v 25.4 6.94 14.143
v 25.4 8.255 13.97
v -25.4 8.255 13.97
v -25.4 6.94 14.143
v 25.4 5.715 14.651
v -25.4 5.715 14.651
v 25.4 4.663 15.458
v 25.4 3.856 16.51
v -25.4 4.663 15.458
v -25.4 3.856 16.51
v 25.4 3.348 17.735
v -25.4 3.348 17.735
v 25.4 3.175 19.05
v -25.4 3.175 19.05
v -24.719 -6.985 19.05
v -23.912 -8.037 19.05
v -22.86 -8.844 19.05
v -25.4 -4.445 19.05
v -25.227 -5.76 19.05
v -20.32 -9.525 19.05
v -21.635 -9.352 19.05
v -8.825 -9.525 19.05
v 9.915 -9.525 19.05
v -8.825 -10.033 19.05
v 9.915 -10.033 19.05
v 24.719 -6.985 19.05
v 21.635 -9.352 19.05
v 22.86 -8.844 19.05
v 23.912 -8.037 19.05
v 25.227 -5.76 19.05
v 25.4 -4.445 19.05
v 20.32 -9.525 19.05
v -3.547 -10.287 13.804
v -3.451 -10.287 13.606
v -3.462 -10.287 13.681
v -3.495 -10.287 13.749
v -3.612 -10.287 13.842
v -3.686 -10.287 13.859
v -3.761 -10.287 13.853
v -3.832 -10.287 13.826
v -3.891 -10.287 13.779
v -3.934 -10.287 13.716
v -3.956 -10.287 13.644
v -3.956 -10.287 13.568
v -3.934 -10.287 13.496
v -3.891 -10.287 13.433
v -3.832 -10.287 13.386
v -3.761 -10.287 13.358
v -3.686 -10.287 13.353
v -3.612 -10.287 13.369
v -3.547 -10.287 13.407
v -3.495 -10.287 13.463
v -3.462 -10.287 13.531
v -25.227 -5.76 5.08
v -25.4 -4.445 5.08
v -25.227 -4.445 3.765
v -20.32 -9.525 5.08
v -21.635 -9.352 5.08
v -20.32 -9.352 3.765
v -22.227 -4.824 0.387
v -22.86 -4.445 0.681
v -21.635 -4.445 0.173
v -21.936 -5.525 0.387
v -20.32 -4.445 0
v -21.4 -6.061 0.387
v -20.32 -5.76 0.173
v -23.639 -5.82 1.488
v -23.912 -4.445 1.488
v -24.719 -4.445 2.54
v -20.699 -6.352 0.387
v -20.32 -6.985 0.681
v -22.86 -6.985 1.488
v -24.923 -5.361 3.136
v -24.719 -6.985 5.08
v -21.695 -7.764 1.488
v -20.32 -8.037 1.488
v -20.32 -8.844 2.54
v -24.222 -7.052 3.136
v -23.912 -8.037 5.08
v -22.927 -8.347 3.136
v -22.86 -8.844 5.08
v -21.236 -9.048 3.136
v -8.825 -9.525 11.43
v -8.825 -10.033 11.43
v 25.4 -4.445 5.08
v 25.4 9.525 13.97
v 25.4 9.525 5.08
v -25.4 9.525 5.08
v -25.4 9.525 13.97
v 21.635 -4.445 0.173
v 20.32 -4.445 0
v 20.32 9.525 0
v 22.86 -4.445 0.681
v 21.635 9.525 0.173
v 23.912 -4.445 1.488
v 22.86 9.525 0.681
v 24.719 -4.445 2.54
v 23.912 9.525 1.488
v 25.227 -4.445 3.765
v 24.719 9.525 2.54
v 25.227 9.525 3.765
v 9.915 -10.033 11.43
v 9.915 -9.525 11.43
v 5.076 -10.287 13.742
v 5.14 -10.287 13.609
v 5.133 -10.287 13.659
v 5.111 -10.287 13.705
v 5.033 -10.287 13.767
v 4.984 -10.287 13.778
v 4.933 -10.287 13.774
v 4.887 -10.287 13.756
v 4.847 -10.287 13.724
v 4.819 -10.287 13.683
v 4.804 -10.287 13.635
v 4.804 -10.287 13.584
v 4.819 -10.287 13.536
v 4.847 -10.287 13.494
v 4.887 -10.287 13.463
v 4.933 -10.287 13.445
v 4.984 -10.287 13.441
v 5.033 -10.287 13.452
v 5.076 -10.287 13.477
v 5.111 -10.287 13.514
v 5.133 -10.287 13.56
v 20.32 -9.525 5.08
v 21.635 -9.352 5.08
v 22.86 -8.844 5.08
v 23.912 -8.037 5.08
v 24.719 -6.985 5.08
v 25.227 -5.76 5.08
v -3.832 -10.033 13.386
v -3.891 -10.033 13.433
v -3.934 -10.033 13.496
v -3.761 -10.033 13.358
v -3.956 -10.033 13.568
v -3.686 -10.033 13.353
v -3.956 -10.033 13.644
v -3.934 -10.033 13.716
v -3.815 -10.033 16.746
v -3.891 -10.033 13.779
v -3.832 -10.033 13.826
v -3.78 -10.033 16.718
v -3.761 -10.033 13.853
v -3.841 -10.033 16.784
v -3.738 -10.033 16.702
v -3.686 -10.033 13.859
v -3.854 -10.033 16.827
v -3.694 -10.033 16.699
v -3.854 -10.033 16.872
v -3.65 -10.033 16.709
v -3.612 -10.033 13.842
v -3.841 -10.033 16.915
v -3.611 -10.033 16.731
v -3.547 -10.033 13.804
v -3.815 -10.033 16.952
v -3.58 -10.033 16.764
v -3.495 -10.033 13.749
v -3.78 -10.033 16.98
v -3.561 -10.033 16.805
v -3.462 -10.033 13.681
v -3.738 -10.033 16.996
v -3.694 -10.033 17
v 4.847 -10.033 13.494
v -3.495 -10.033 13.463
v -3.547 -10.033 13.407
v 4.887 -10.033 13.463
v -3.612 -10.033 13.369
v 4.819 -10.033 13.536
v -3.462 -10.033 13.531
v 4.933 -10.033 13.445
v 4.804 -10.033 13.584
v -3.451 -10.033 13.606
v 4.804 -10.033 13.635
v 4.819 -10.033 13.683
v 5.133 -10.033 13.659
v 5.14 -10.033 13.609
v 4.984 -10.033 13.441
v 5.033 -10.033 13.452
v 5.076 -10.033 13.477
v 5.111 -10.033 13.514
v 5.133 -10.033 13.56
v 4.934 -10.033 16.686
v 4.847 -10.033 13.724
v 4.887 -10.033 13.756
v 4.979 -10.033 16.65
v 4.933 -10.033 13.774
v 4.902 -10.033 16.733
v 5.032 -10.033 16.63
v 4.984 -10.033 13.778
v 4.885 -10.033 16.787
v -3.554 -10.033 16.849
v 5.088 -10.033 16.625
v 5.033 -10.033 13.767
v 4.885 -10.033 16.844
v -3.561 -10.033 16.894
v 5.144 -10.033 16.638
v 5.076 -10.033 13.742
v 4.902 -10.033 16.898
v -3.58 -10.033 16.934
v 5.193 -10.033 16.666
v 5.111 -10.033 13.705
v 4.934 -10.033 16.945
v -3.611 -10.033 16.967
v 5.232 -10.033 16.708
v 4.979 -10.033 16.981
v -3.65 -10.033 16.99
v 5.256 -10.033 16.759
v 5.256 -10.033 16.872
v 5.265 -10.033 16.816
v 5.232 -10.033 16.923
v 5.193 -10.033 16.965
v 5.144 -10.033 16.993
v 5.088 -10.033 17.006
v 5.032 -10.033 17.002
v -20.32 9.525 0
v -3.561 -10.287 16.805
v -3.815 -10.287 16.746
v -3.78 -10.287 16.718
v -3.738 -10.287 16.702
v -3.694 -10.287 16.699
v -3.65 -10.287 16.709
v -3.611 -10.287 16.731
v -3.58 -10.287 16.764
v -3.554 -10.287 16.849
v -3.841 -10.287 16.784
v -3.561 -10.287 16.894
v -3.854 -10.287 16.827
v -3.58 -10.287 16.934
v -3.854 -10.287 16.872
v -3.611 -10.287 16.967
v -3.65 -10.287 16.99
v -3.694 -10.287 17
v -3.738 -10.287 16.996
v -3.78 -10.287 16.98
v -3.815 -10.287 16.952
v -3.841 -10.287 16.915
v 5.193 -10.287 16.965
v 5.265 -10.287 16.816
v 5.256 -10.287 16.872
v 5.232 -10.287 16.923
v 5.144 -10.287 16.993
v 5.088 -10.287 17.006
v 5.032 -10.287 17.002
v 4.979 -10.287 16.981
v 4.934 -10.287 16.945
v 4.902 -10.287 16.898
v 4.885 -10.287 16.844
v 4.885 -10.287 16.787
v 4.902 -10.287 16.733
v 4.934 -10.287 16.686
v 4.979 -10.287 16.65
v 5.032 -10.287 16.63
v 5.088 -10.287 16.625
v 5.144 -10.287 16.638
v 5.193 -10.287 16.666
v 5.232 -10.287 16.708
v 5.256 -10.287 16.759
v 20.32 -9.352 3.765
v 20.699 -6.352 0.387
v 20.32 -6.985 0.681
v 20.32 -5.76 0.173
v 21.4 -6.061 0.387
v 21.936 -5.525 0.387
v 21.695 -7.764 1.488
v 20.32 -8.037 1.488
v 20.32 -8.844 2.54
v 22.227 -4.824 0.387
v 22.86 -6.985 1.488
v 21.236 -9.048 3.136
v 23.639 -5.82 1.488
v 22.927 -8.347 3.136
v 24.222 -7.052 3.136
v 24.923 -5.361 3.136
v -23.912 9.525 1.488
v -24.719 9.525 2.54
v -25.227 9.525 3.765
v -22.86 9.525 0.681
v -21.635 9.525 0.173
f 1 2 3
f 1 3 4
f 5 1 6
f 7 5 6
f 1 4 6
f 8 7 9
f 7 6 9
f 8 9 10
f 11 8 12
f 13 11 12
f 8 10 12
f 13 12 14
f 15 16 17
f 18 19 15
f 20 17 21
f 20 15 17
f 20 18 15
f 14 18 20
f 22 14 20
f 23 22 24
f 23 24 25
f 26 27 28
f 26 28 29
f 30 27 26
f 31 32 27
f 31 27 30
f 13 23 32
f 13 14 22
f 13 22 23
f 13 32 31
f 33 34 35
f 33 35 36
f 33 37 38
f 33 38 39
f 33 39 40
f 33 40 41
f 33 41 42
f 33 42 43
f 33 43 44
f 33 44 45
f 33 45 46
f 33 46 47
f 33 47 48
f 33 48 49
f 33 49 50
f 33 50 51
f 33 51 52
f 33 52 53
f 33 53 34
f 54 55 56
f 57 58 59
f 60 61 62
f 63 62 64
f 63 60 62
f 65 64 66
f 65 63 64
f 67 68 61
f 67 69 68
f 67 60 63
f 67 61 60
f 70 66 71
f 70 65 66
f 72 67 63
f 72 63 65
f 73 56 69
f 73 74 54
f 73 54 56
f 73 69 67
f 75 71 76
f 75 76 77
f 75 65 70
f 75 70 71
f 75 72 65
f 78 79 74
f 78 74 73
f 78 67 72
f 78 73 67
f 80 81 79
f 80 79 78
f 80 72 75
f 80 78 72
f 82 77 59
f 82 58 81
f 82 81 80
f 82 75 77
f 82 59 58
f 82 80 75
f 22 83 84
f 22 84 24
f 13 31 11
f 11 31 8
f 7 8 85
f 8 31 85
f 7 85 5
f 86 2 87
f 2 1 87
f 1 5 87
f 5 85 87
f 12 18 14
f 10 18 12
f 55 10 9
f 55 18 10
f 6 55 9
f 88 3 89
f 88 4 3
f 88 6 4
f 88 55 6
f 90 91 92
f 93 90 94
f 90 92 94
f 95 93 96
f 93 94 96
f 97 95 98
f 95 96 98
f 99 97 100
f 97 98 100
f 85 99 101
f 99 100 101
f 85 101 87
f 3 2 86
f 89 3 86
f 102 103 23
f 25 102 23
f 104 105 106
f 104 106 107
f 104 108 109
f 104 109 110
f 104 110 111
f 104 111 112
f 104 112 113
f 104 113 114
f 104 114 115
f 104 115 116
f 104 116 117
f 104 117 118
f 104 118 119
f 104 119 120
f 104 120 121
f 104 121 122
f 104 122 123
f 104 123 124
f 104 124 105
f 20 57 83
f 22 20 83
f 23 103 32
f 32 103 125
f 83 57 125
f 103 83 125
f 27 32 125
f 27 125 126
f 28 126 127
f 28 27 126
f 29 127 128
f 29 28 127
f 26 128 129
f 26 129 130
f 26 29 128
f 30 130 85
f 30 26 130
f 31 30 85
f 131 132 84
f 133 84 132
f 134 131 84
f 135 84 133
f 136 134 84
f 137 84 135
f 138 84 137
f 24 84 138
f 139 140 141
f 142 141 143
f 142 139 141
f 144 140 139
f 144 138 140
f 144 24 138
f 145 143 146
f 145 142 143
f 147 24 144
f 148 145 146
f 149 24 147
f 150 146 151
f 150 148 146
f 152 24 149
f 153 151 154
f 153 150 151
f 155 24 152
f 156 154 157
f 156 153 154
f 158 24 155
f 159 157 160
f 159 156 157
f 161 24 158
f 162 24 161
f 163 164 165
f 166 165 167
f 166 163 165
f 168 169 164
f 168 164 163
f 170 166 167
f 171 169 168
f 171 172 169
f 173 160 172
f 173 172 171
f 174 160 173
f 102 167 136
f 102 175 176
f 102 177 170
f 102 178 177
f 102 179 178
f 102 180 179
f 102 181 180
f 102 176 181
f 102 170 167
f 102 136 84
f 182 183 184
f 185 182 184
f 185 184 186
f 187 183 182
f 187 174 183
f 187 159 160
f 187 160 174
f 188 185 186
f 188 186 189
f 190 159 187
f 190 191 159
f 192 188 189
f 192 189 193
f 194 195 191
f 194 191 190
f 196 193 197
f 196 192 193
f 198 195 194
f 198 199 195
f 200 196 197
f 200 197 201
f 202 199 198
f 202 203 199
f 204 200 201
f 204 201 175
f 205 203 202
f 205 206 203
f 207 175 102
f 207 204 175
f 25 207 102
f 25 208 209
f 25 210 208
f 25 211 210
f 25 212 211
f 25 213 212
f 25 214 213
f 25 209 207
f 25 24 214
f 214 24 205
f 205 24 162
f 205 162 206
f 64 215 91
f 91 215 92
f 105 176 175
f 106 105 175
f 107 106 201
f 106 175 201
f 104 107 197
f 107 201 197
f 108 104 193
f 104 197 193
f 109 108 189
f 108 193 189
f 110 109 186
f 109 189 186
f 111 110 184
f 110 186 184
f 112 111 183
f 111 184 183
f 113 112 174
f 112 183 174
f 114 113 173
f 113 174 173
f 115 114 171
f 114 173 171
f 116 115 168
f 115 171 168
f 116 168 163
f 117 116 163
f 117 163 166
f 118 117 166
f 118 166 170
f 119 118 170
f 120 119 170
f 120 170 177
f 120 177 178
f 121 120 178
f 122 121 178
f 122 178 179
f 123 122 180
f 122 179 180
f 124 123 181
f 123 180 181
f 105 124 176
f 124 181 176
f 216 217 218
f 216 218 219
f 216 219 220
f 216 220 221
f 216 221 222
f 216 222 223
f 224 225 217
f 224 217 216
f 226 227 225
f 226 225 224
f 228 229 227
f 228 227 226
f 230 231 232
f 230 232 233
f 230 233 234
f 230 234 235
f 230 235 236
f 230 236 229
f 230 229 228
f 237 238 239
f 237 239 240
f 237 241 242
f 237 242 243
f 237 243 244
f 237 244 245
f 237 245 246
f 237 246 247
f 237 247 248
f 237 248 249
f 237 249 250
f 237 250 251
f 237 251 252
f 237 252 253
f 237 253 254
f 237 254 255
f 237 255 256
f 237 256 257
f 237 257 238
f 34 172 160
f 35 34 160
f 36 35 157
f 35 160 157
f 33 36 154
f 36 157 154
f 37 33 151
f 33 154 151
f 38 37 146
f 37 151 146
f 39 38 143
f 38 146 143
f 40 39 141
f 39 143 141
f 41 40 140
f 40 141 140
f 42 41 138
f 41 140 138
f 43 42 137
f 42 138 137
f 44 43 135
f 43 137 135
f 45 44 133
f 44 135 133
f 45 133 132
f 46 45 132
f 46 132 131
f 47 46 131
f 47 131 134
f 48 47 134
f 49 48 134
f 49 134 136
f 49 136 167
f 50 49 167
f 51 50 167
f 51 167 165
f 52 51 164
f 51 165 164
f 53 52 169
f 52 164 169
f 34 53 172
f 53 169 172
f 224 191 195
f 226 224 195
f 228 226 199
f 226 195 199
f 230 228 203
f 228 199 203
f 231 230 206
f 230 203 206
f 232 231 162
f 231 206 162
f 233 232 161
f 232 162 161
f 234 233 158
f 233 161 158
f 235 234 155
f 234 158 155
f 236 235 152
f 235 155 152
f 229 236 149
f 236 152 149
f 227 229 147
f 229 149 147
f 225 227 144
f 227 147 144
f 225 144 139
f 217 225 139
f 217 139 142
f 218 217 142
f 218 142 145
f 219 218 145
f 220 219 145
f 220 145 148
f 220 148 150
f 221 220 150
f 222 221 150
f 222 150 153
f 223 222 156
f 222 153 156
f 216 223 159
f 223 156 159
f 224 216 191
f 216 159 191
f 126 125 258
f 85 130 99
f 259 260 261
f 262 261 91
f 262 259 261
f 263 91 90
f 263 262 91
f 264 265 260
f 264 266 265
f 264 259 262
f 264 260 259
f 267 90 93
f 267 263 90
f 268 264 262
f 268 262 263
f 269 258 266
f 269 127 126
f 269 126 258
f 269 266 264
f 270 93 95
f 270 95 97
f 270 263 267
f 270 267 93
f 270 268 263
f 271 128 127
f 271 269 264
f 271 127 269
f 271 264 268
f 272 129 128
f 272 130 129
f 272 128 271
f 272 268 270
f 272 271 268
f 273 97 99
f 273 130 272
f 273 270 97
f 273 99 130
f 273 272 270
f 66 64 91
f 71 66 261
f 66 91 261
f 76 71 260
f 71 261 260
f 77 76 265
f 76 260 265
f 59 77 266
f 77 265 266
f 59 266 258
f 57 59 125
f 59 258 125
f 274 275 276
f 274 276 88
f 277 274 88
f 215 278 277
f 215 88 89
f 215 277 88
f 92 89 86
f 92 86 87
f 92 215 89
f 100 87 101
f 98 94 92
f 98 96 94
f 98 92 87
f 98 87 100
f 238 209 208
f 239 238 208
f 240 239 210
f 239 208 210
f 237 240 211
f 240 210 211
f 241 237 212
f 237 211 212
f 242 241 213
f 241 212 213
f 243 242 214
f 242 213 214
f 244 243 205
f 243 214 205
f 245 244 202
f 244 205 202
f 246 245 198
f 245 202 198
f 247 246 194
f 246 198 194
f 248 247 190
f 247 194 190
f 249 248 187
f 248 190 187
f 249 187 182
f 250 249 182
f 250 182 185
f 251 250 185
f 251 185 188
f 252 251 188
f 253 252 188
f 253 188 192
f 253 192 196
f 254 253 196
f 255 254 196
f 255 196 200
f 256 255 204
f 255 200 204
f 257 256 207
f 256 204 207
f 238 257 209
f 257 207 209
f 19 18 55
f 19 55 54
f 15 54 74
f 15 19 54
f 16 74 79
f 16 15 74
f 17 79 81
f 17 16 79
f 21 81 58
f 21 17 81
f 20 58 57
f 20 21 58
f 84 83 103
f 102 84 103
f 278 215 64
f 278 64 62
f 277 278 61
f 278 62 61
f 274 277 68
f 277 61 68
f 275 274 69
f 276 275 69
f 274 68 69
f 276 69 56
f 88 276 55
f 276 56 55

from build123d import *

# Parameters (mm, degrees)
F0_W     = 50.8
F0_H     = 19.05
F1_DEPTH = 19.05
F2_R     = 5.08
F3_R     = 5.08
F4_W     = 18.7399210408
F4_H     = 7.62
F5_DEPTH = 0.508
F6_R     = 0.1690866305
F6_R_2   = 0.254
F6_R_3   = 0.1908338751
F6_R_4   = 0.1508847562
F7_DEPTH = 0.254
F8_W     = 6.35
F8_H     = 5.08
F9_DEPTH = 50.8
F10_R    = 5.07999


# Not quite as in the source:
# - a fillet or chamfer is up to 0.001 mm smaller than in the source, because OpenCascade refuses the exact size


with BuildPart() as f1:
    # F0 (on Top) → F1 (new body)
    with BuildSketch(Plane.XY):
        Rectangle(F0_W, F0_H)
    extrude(amount=F1_DEPTH)

    # F2
    f2_edges = [f1.edges().sort_by_distance(p)[0] for p in [
        (-25.4, -9.525, 9.525),
        (25.4, -9.525, 9.525),
    ]]
    fillet(f2_edges, radius=F2_R)

    # F3
    f3_edges = [f1.edges().sort_by_distance(p)[0] for p in [
        (25.4, 2.54, 0),
    ]]
    fillet(f3_edges, radius=F3_R)

    # F4 (on face) → F5 (join)
    with BuildSketch(Plane.XZ.offset(9.525)):
        with Locations((0.5450607277, 15.24)):
            Rectangle(F4_W, F4_H)
    extrude(amount=F5_DEPTH)

    # F6 (on face) → F7 (join)
    with BuildSketch(Plane.XZ.offset(10.033)):
        with Locations((4.971065205, 13.6094420754)):
            Circle(F6_R)
        with Locations((-3.7048892478, 13.6058607324)):
            Circle(F6_R_2)
        with Locations((5.0740026747, 16.8156122121)):
            Circle(F6_R_3)
        with Locations((-3.7048892478, 16.8490853095)):
            Circle(F6_R_4)
    extrude(amount=F7_DEPTH)

    # F8 (on face) → F9 (cut)
    with BuildSketch(Plane.YZ.offset(25.4)):
        with Locations((6.35, 16.51)):
            Rectangle(F8_W, F8_H)
    extrude(amount=-F9_DEPTH, mode=Mode.SUBTRACT)

    # F10 (radius 5.08 in the source; OpenCascade refuses exactly that, so slightly less here)
    f10_edges = [f1.edges().sort_by_distance(p)[0] for p in [
        (0, 3.175, 13.97),
    ]]
    fillet(f10_edges, radius=F10_R)


solid = f1.part
